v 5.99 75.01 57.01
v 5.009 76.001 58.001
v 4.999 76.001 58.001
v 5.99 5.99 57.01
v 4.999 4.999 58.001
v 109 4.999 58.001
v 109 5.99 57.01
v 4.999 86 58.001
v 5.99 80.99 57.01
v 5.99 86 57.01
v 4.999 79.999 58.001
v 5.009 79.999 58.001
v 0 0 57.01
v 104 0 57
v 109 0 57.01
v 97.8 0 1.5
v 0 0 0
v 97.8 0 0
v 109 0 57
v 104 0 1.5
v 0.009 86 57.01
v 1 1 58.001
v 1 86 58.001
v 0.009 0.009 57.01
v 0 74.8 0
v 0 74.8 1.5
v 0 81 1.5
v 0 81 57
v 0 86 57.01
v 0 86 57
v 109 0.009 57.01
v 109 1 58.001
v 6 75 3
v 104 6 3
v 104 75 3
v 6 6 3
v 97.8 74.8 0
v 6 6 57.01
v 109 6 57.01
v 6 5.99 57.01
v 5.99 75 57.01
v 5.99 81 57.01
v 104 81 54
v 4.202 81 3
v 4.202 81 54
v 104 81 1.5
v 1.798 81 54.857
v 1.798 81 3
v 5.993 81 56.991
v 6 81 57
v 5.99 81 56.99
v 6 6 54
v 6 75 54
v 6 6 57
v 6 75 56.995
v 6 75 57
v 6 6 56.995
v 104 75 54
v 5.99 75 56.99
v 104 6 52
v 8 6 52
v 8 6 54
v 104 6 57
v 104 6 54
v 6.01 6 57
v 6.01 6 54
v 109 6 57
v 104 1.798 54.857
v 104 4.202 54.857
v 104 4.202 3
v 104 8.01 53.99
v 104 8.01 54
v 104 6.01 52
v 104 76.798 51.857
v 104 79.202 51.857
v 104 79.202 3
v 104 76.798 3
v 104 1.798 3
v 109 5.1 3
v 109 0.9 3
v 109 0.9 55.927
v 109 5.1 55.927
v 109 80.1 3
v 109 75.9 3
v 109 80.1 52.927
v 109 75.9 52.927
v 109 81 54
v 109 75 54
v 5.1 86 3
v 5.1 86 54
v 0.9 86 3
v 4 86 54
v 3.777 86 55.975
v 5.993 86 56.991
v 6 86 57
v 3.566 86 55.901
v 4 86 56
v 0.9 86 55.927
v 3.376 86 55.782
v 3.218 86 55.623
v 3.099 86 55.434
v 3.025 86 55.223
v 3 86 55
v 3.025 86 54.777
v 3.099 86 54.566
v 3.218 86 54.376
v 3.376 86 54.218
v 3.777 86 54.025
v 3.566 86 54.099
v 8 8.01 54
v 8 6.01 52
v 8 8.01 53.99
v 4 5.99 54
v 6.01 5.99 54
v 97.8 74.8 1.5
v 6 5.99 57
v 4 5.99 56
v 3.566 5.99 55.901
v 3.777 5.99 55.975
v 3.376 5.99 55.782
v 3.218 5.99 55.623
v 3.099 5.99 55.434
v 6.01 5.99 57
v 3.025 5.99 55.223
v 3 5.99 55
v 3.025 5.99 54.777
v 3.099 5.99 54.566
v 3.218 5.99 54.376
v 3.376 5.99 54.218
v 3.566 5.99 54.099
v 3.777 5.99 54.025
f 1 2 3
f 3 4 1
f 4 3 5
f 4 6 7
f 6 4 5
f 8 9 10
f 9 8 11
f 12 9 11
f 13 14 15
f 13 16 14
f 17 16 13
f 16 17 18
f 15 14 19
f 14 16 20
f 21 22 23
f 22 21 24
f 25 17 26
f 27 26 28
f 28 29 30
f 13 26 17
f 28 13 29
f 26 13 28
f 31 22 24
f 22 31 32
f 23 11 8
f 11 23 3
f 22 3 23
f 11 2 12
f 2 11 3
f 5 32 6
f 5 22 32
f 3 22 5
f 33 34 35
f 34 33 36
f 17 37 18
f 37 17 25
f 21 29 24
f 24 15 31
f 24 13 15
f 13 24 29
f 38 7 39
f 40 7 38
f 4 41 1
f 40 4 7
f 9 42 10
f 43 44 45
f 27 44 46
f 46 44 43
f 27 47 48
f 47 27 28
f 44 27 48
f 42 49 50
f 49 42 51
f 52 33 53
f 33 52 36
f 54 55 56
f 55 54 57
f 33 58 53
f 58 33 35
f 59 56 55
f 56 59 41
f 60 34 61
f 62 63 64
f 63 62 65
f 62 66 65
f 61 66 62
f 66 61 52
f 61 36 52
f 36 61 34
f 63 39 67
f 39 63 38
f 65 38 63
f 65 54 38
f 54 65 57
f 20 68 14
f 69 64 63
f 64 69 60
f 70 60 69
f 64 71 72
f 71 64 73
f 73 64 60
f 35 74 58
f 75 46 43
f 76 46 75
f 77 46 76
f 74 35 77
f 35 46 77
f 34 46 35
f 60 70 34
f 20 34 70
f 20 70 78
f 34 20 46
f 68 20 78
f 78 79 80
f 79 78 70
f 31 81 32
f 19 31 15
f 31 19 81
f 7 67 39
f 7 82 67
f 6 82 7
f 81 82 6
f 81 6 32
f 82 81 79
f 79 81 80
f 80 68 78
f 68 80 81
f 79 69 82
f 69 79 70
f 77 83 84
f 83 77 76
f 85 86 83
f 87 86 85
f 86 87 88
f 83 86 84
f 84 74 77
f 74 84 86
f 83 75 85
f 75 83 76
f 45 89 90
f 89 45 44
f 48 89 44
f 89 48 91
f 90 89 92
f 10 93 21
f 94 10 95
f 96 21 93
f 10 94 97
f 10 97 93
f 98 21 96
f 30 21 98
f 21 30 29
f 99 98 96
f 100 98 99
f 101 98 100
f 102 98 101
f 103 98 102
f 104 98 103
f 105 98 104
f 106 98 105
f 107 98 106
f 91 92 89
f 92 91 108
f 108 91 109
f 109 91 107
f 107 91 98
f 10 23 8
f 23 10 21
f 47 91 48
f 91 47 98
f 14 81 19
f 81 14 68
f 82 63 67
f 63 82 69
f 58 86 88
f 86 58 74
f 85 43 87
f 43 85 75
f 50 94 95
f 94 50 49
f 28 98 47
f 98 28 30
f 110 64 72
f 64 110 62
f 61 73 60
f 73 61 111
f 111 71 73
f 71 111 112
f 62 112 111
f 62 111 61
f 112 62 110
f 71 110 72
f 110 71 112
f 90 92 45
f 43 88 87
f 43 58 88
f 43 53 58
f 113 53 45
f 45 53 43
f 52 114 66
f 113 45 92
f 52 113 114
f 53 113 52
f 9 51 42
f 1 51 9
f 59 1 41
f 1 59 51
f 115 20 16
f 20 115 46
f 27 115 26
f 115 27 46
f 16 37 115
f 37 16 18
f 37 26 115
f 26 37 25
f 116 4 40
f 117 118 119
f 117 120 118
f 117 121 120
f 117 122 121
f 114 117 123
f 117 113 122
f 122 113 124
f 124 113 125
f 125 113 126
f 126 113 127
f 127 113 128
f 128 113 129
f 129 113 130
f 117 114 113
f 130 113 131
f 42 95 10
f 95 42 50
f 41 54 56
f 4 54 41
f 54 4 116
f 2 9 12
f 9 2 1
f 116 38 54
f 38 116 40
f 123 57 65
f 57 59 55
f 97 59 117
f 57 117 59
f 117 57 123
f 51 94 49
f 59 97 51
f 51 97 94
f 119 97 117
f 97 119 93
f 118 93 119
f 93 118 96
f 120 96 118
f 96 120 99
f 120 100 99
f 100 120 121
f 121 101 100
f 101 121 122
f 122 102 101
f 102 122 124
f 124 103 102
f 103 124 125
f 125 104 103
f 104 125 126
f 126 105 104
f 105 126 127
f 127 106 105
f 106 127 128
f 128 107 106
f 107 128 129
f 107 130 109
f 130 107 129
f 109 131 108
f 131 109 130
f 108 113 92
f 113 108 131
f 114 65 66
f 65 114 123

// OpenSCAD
// ============================================================================
// cutlery_box.scad
// Graduated 3-chamber disposable-cutlery box (Option 3) — CUT-FROM-SOLID port
// of build_box.py, for a 120 x 120 x 120 mm printer (AOSEED).
//
// WHY THIS PORT EXISTS (the whole point):
//   The hand-mesh generator (build_box.py) could not keep the 1 mm rim chamfer
//   continuous across the female dovetail joints, because where a slot's flared
//   corner crosses the sloped chamfer it needs a true boolean intersection.
//   OpenSCAD HAS that boolean kernel, so here we do exactly the "cut-from-solid"
//   thing:
//      1. Build the ENTIRE box as ONE solid, WITH the chamfer already on it.
//      2. difference() out vertical dovetail prisms ( /_\ cross-section ),
//         running from just above the base plate up THROUGH the rim, to both
//         (a) form the sliding-dovetail joints, and
//         (b) split the box into 6 bed-sized pieces.
//   Because the cut is a real boolean through the already-chamfered solid, the
//   sloped chamfer<->slot edge is produced for free => the rim chamfer stays
//   CONTINUOUS across every joint, with none of the sliver hacks.
//
// ----------------------------------------------------------------------------
// HOW TO USE
//   In the app:  set `part` below (or use the Customizer dropdown), F5 to
//                preview, F6 to render, then File > Export > STL.
//   One piece (CLI):
//      openscad -o body_knife_A.stl -D 'part="knife_A"' cutlery_box.scad
//   ALL SIX (bash, run from this folder):
//      for p in knife_A knife_B fork_A fork_B spoon_A spoon_B; do \
//        openscad -o "body_$p.stl" -D "part=\"$p\"" cutlery_box.scad ; done
//   PNG preview of one piece:
//      openscad -o knife_B.png --imgsize=1400,1000 --autocenter --viewall \
//        -D 'part="knife_B"' cutlery_box.scad
//
//   Pieces are modelled in ASSEMBLED coordinates (floor-down, z=0 is the bed),
//   so importing all six STLs together shows the assembled box directly; your
//   slicer will auto-drop each one onto the plate for printing.
//
// BED SANITY: every piece is <= 120 mm in X, Y, Z.
//   Z = 58 mm. Widest piece = spoon at 117 mm (Y). A-halves reach 109 mm (X,
//   including the protruding dovetail key). All under 120.
//
// !! I could NOT run OpenSCAD to verify this file (no binary in my sandbox) !!
//   - The rim chamfer is a SMOOTH, true-45 bevel built from hull() frustums of
//     convex rectangles. Works in every OpenSCAD since ~2015 (incl. Homebrew
//     2021.01). No stepped staircase -- and, crucially, it makes box() a clean
//     well-formed solid so the per-part booleans resolve reliably (the old
//     14-slice staircase was fragile and CGAL was dropping the walls of the
//     interior parts, leaving only the key prisms => "floating boxes").
//   - roof() is still available behind USE_ROOF=true for those who have it
//     (2021.01+ snapshots); for THIS rectangular design it is identical, so it
//     is NOT required.
//   - After F6, check the console for "WARNING"/"not a valid 2-manifold".
//     If a tenon ever looks detached, bump EPS to 0.05.
// ============================================================================


/* [Part to render / export] */
part = "knife_A"; // [knife_A, knife_B, fork_A, fork_B, spoon_A, spoon_B, assembly]

/* [Chamfer method] */
// false = smooth hull() frustum bevel (default, any OpenSCAD); true = roof() (2021.01+)
USE_ROOF = false;

/* [Heights (mm)] */
BASE   = 3.0;     // floor / base-plate thickness
COMP_H = 55.0;    // interior wall height above the floor (cutlery stack depth)

/* [Walls (mm)] */
HOST_T   = 6.0;     // thickness of every wall (thick enough to host a dovetail)
HALF_LEN = 104.0;   // printed length of each half (A = near, B = far); <120 incl. key

/* [Chamber bays (mm)] */
N_COL     = 3;       // columns of cutlery per chamber
KNIFE_COL = 23.0;    // -> knife bay 69  (3 x 19 mm knives + play)
FORK_COL  = 33.0;    // -> fork  bay 99  (3 x 29 mm forks  + play)
SPOON_COL = 37.0;    // -> spoon bay 111 (3 x 34 mm spoons + play, trimmed <120)

/* [Dovetail joint (mm)] */
DT_DEPTH = 5.0;   // tail protrusion past the seam (male key depth)
DT_NECK  = 1.2;   // half-width at the seam face (narrow)
DT_FLARE = 2.1;   // half-width at the tip (wide -> locks)
DT_CLR   = 0.4;   // FLANK/seam slide clearance added to the female socket (do not change for fit)
DT_DEPTH_RELIEF = 0.3; // extra depth on the socket BACK only, so the tail tip never bottoms out

/* [Hidden-dovetail top cap / "hat" (mm)] */
// The dovetail otherwise shows its trapezoid outline on the TOP edge of the wall.
// To hide it, the MALE piece extends the wall's full-width top (chamfer included)
// across the key footprint -> a flush, continuous top. The FEMALE piece gets a
// matching top RECESS (cap footprint + CAP_CLR) so the cap drops straight in.
// Result: the top reads as one surface with a single straight seam line at the cap
// tip; the dovetail joinery lives entirely below the cap.
//
// SELF-SUPPORTING UNDERSIDE: the cap reaches the FULL wall width at the chamfer base
// (so the top edge reads as the wall extended, with NO recessed sliver on the outer
// face), and its underside is ONE planar ramp from the chamfer's OUTER CORNER
// (half-width HOST_T/2 at z = BODY_H-CHAMFER) down to the dovetail-neck half-width
// (CAP_FOOT) at CAP_SLANT_DEG from horizontal. No little horizontal step. The ramp
// reaching full width exactly at the chamfer base means "ramp top" == "chamfer base"
// (CAP_H is DERIVED). The FEMALE recess is the same ramp + CAP_CLR play.
// TRADEOFF: because the cap runs all the way to the outer corner, the female wall
// tapers to ~0 at z = BODY_H-CHAMFER -> a thin feather edge at the joint (gradual at
// CAP_SLANT_DEG, hidden inside the joint when assembled). Accepted per design intent.
CAP_SLANT_DEG = 50;     // cap underside ramp angle from horizontal (50 = self-supporting, long flare)
CAP_FOOT = DT_NECK;     // cap-underside half-width where it meets the dovetail neck
CAP_CLR = 0.3;          // slide clearance so the male cap seats into the female top recess

/* [Rim chamfer (mm)] */
CHAMFER = 1.0;    // 45-deg comfort break broken along the top wall edges

/* [Base half-lap / anti-warp (mm)] */
// Neighbouring base plates overlap as a HORIZONTAL half-lap (shiplap) at mid-base
// height, so corners stay coplanar (no lift/protrusion). Horizontal lap faces do
// NOT bind the vertical-drop assembly. Shingle direction: A->B and knife->fork->spoon.
LAP_LEN = 6;        // overlap past the A/B seam and the knife/fork seam
LAP_LEN_FS = 2;     // overlap past the fork/SPOON seam -- SMALLER: spoon is the
                    // tightest piece (117mm of the 120mm bed); a 6mm lap there
                    // would push spoon to 123mm. 2mm keeps spoon at 119mm.
LAP_Z   = BASE/2;   // 1.5 -- horizontal split height of the lap (bottom vs top half)
LAP_CLR = 0.2;      // in-plane clearance so the shelf isn't a press fit

/* [Lid — box features that receive a flat ORDERED clear sheet] */
// The lid itself is NOT printed: it's a flat ~2 mm PETG/Tritan sheet, bullnose-polished
// edges (r=LID_EDGE_R), ordered to size. We only model the box features that receive it.
LID_T            = 2.0;   // ordered sheet thickness
LID_EDGE_R       = 1.0;   // ordered sheet bullnose edge radius (for the sheet order spec)
LID_PLAY         = 0.4;   // total vertical play in the hinge groove (sheet + this)
LID_RECESS       = 2.0;   // lid TOP sits this far BELOW the rim, so the journal pocket is fully
                          // capped (rim caps the bullnose -> retains the lid when raised; tilt-in)
HINGE_AT_MINUS_X = true;  // hinge on the -x (303mm) end wall; clip on +x. (flip = mirror; default delivered)
// perimeter support ledge (lid underside rests on it at z = BODY_H-LID_T)
LEDGE_W          = 2.0;   // ledge inward protrusion (its underside ramps back at 45 deg -> self-supporting)
GROOVE_END_INSET = 0.0;   // groove reaches the corners but RUNS OUT smoothly there (no end-face / no
                          // exposed bore); GROOVE_TAPER sets the run-out length
GROOVE_TAPER     = 4.0;   // y-length over which the eased mouth tapers out at each groove end
// hinge journal (cut into the inner face of the hinge end wall, CONTINUOUS along the long edge)
GROOVE_DEPTH     = 3.0;   // 2mm lead-in slot + 1mm pocket radius -> journal sits 2mm back from the
                          // face so its cap clears the swing relief and RETAINS the lid
GROOVE_POCKET_R  = 1.0;   // journal half-cylinder radius (the bullnose sheet edge rolls in it)
// clip latch (one localized retainer, centered on the clip end wall)
CLIP_W           = 18.0;  // clip width
CLIP_LIP         = 0.4;   // retaining overhang (0.3 light .. 0.6 firm)
CLIP_RAMP_H      = 1.6;   // cam-ramp height above the rim (press-to-close)
// finger scallop (semicircular dish in the rim, centered on & aligned with the clip)
SCALLOP_W        = 16.0;  // scallop width
SCALLOP_DEPTH    = 6.0;   // how far it dishes down from the rim


/* [Hidden] */
EPS      = 0.01;          // tiny overlap so abutting solids fuse cleanly in CGAL
// Upper-chamber pieces (fork, spoon) were cut by a cell plane laid EXACTLY on the
// divider wall's far face (the lower chamber owns that wall). intersection() along a
// plane coincident with an existing box face makes CGAL leave a ZERO-THICKNESS copy
// of the wall face -> edge-manifold + "watertight" but degenerate (OpenSCAD shows it
// as a blue back-face; Tinkercad thickens it into a phantom block). SEAM_EPS nudges
// those cut planes a hair INTO the open bay so they no longer coincide with any box
// face -> no flap. 0.02 mm is physically nothing but is well clear of CGAL's tolerance.
SEAM_EPS = 0.02;
CUT_OVER = 1.0;           // how far dovetail cutters overshoot the rim (clean cut)

BODY_H    = BASE + COMP_H;     // 58  total height
END_WALL  = HOST_T;            // end walls are dovetail hosts too -> equally thick
TOTAL_LEN = 2 * HALF_LEN;      // 208 assembled length (end wall .. end wall)

// hidden-cap ramp geometry (derived).
//   CAP_HW    = cap MAX half-width = HOST_T/2 (the full wall edge) at the chamfer base.
//   CAP_RISE  = vertical height of the self-supporting CAP_SLANT_DEG underside ramp.
//   CAP_ZRAMP = where the cap reaches full width = the chamfer base (BODY_H-CHAMFER), so
//               the ramp runs straight to the chamfer OUTER CORNER (no horizontal step).
//   CAP_ZBOT  = cap bottom = ramp start; CAP_H derived from it (for reference/report).
//   CAP_ZRAMP_R = recess ramp top, shifted down by CAP_CLR so the recess ramp stays
//               parallel to the cap ramp with uniform play.
CAP_HW      = HOST_T/2;   // cap reaches the FULL wall edge at the chamfer base
CAP_RISE    = (CAP_HW - CAP_FOOT) * tan(CAP_SLANT_DEG);
CAP_ZRAMP   = BODY_H - CHAMFER;               // full width exactly at the chamfer base / outer corner
CAP_ZBOT    = CAP_ZRAMP - CAP_RISE;
CAP_H       = BODY_H - CAP_ZBOT;              // derived; reported
CAP_ZRAMP_R = CAP_ZRAMP;   // recess ramp ALSO tops at the chamfer corner (mirror the cap) -> no vertical lip
// sanity checks
assert(CAP_ZBOT > BASE + 1,
       "cap zone dips too low -- raise CAP_SLANT_DEG");
assert(CAP_HW >= DT_FLARE,
       "cap too narrow to cover the dovetail tail");

// NOTE: lid-derived constants are defined BELOW the Y-layout block, because some of
// them (INTERIOR_Y0/Y1, CLIP_CY) depend on OUTER_L / OUTER_R / EXT_W. See "lid derived".

// bay widths
KNIFE_BAY = N_COL * KNIFE_COL; // 69
FORK_BAY  = N_COL * FORK_COL;  // 99
SPOON_BAY = N_COL * SPOON_COL; // 111

// ---- Y layout (width direction): wall | bay | divider | bay | divider | bay | wall
KNIFE_Y0 = 0;
KNIFE_Y1 = HOST_T + KNIFE_BAY + HOST_T;        // 0..81   (outer wall + bay + divider)
FORK_Y0  = KNIFE_Y1;                           // 81
FORK_Y1  = FORK_Y0 + FORK_BAY + HOST_T;        // 81..186 (bay + divider)
SPOON_Y0 = FORK_Y1;                            // 186
SPOON_Y1 = SPOON_Y0 + SPOON_BAY + HOST_T;      // 186..303(bay + outer wall)
EXT_W    = SPOON_Y1;                           // 303 total width

// lengthwise wall Y-bands [y0,y1] (host the A/B dovetails) + their centers
OUTER_L  = [0, HOST_T];                                       // [0,6]    c=3
DIV_KF   = [HOST_T + KNIFE_BAY, HOST_T + KNIFE_BAY + HOST_T]; // [75,81]  c=78
DIV_FS   = [FORK_Y0 + FORK_BAY, FORK_Y0 + FORK_BAY + HOST_T]; // [180,186]c=183
OUTER_R  = [SPOON_Y1 - HOST_T, SPOON_Y1];                     // [297,303]c=300

// ---- lid derived ---- (placed AFTER OUTER_L/OUTER_R/EXT_W so nothing is forward-referenced)
LID_TOP_Z   = BODY_H - LID_RECESS;        // 56  lid TOP (recessed); rim z=58 rises LID_RECESS above it
LID_Z_UNDER = LID_TOP_Z - LID_T;          // 54  lid underside / ledge top / lowered-divider top
POCKET_CZ   = LID_TOP_Z - LID_T/2;        // 55  journal centre (lid mid) -> pocket top = LID_TOP_Z = capped
// hinge end-wall inner face x + inward direction; clip end-wall inner face x + inward dir
HINGE_INX   = HINGE_AT_MINUS_X ? END_WALL : TOTAL_LEN - END_WALL;       // 6  (default)
HINGE_IN    = HINGE_AT_MINUS_X ? 1 : -1;  // interior direction from the hinge wall (+x default)
CLIP_INX    = HINGE_AT_MINUS_X ? TOTAL_LEN - END_WALL : END_WALL;       // 202 (default)
CLIP_IN     = HINGE_AT_MINUS_X ? -1 : 1;  // interior direction from the clip wall (-x default)
POCKET_CX   = HINGE_INX - HINGE_IN*(GROOVE_DEPTH - GROOVE_POCKET_R);    // 5  pocket centre x (INTO the wall)
INTERIOR_Y0 = OUTER_L[1];                 // 6   inner face of the -y short wall
INTERIOR_Y1 = OUTER_R[0];                 // 297 inner face of the +y short wall
CLIP_CY     = EXT_W/2;                     // 151.5 clip/scallop centre (in the fork chamber)
assert(POCKET_CZ - GROOVE_POCKET_R > BASE + 1,
       "journal dips too low -- reduce LID_RECESS or LID_T");
assert(POCKET_CZ + GROOVE_POCKET_R <= LID_TOP_Z + EPS,
       "journal not capped -- lower the lid (raise LID_RECESS) or shrink GROOVE_POCKET_R");
// NOTE: with LID_RECESS the lid underside (and lowered dividers) sit BELOW CAP_ZBOT. That is
// intended: the inner dividers are cut flat below the cap zone (their hidden caps are removed,
// but the lid covers them); the perimeter/end-wall caps are untouched (full-height walls).

// the three OPEN bays are rectangular holes in the wall footprint:
//   footprint = outer rectangle MINUS these bays  (== the 6 walls; verified).
// The smooth chamfer is built from exactly this decomposition.
BAY_X0 = END_WALL;              // 6
BAY_X1 = TOTAL_LEN - END_WALL;  // 202
BAYS = [
    [BAY_X0, BAY_X1, HOST_T,   HOST_T + KNIFE_BAY],   // knife bay [6,202] x [6,75]
    [BAY_X0, BAY_X1, FORK_Y0,  FORK_Y0 + FORK_BAY],   // fork  bay [6,202] x [81,180]
    [BAY_X0, BAY_X1, SPOON_Y0, SPOON_Y0 + SPOON_BAY], // spoon bay [6,202] x [186,297]
];

YC_OUTL  = OUTER_L[0] + HOST_T/2;   // 3   outer-left wall center
YC_DIVKF = DIV_KF[0]  + HOST_T/2;   // 78  knife/fork divider center
YC_DIVFS = DIV_FS[0]  + HOST_T/2;   // 183 fork/spoon divider center
YC_OUTR  = OUTER_R[0] + HOST_T/2;   // 300 outer-right wall center

// seams
AB_SEAM = HALF_LEN;               // 104  A/B length seam (x)
SEAM_KF = FORK_Y0;                // 81   knife/fork width seam (y)
SEAM_FS = SPOON_Y0;              // 186  fork/spoon width seam (y)
ENDC_A  = END_WALL/2;             // 3    A end-wall center (x) -> chamber dovetails
ENDC_B  = TOTAL_LEN - END_WALL/2; // 205  B end-wall center (x)


// ============================================================================
// 2D wall footprint (cross-section of all walls, constant in z for the straight
// part). Union of: 2 full-width end walls + 4 lengthwise walls between them.
// ============================================================================
module wall_footprint_2d() {
    // footprint = outer rectangle minus the 3 open bays  (== the 6 walls)
    difference() {
        square([TOTAL_LEN, EXT_W]);
        for (b = BAYS) translate([b[0], b[2]]) square([b[1] - b[0], b[3] - b[2]]);
    }
}

// ============================================================================
// The full chamfered box solid = base plate + walls with a continuous 1 mm
// top-rim chamfer. Built ONCE; every piece is carved out of this.
// ============================================================================
module chamfer_cap() {
    // SMOOTH 45 rim chamfer over z[BODY_H-CHAMFER, BODY_H], in absolute coords.
    zm = BODY_H - CHAMFER;
    if (USE_ROOF) {
        // exact straight-skeleton roof, capped at CHAMFER height (needs roof()).
        intersection() {
            translate([0,0,zm]) roof() wall_footprint_2d();
            translate([0,0,zm]) linear_extrude(CHAMFER + EPS) wall_footprint_2d();
        }
    } else {
        // DEFAULT: true 45 bevel as hull() frustums of CONVEX rectangles -> smooth
        // AND a clean manifold.  Since footprint = outer - bays, the chamfer of the
        // footprint = (outer rectangle beveled inward) MINUS (each bay beveled so it
        // grows toward the top, which bevels every bay-facing rim).  All hull()s are
        // on convex rectangles, so nothing gets convex-filled.
        difference() {
            // outer perimeter frustum: full outer rect at zm -> inset by CHAMFER at top
            hull() {
                translate([0,0,zm])     linear_extrude(0.001) square([TOTAL_LEN, EXT_W]);
                translate([0,0,BODY_H]) linear_extrude(0.001) offset(delta=-CHAMFER) square([TOTAL_LEN, EXT_W]);
            }
            // each bay grows by CHAMFER toward the top -> bevels its surrounding rim.
            // (overshoots z a hair past both ends so the cut is clean.)
            for (b = BAYS)
                hull() {
                    translate([0,0,zm-EPS])     linear_extrude(0.001)
                        translate([b[0],b[2]]) offset(delta=-EPS)        square([b[1]-b[0], b[3]-b[2]]);
                    translate([0,0,BODY_H+EPS]) linear_extrude(0.001)
                        translate([b[0],b[2]]) offset(delta=CHAMFER+EPS) square([b[1]-b[0], b[3]-b[2]]);
                }
        }
    }
}

module box() {
    zm = BODY_H - CHAMFER;
    union() {
        cube([TOTAL_LEN, EXT_W, BASE]);                                        // base plate z[0,3]
        translate([0,0,BASE]) linear_extrude(zm - BASE + EPS) wall_footprint_2d(); // straight walls z[3,57]
        chamfer_cap();                                                         // smooth chamfer z[57,58]
    }
}

// ============================================================================
// Dovetail prisms ( /_\ ). Vertical, z[BASE, BODY_H+CUT_OVER] so they cut
// through the rim but leave the base plate continuous. The near face is pushed
// back EPS so a male key always fuses to its wall.
//   male key   : half_n=DT_NECK,         half_f=DT_FLARE
//   female slot: half_n=DT_NECK+DT_CLR,  half_f=DT_FLARE+DT_CLR
// ============================================================================
module dt_prism_X(seam_x, yc, half_n, half_f) {   // perpendicular to X, grows +X
    translate([0,0,BASE]) linear_extrude(BODY_H - BASE + CUT_OVER)
        polygon([[seam_x - EPS,        yc - half_n],
                 [seam_x + DT_DEPTH,   yc - half_f],
                 [seam_x + DT_DEPTH,   yc + half_f],
                 [seam_x - EPS,        yc + half_n]]);
}
module dt_prism_Y(seam_y, xc, half_n, half_f) {   // perpendicular to Y, grows +Y
    translate([0,0,BASE]) linear_extrude(BODY_H - BASE + CUT_OVER)
        polygon([[xc - half_n, seam_y - EPS],
                 [xc - half_f, seam_y + DT_DEPTH],
                 [xc + half_f, seam_y + DT_DEPTH],
                 [xc + half_n, seam_y - EPS]]);
}
module ab_key   (yc)        { dt_prism_X(AB_SEAM, yc, DT_NECK, DT_FLARE); }
module ch_key   (seam_y, xc){ dt_prism_Y(seam_y, xc, DT_NECK, DT_FLARE); }

// Female sockets = male + DT_CLR on the flanks/seam (unchanged), PLUS a straight
// back-face relief of DT_DEPTH_RELIEF so the tail tip never bottoms out. The
// relief is a rectangle tacked onto the trapezoid's tip at the SAME flare width,
// so the angled flank faces (and their 0.4 mm slide clearance) are untouched.
module ab_socket(yc) {
    dt_prism_X(AB_SEAM, yc, DT_NECK + DT_CLR, DT_FLARE + DT_CLR);
    translate([0,0,BASE]) linear_extrude(BODY_H - BASE + CUT_OVER)
        translate([AB_SEAM + DT_DEPTH, yc - (DT_FLARE + DT_CLR)])
            square([DT_DEPTH_RELIEF, 2*(DT_FLARE + DT_CLR)]);          // back relief, +X
}
module ch_socket(seam_y, xc) {
    dt_prism_Y(seam_y, xc, DT_NECK + DT_CLR, DT_FLARE + DT_CLR);
    translate([0,0,BASE]) linear_extrude(BODY_H - BASE + CUT_OVER)
        translate([xc - (DT_FLARE + DT_CLR), seam_y + DT_DEPTH])
            square([2*(DT_FLARE + DT_CLR), DT_DEPTH_RELIEF]);          // back relief, +Y
}

// ===== hidden-dovetail top cap ("hat"), SELF-SUPPORTING underside ===============
// MALE cap: a FULL-wall-width hat whose underside is ONE planar ramp from the chamfer's
// OUTER CORNER (half-width CAP_HW = HOST_T/2 at CAP_ZRAMP = BODY_H-CHAMFER) down to the
// dovetail-neck half-width (CAP_FOOT) at CAP_SLANT_DEG from horizontal -> the self-
// supporting shoulder, running straight to the corner (no horizontal step). Built as
// hull(narrow bottom slab buried in the tail neck, full-width top slab through the rim);
// box() trims it to the wall and adds the continuous rim chamfer for free, so the outer
// top edge reads as the wall extended (no recessed sliver). The protruding NOSE is left
// SQUARE (vertical) -- hidden in the female socket when assembled.
// TRADEOFF: the female wall tapers to ~0 at z=BODY_H-CHAMFER (a thin feather edge at the
// joint, gradual at CAP_SLANT_DEG) -- accepted per design intent.
module ab_cap(yc) {   // A/B seam, grows +X past the seam (length direction)
    hull() {
        translate([AB_SEAM - EPS, yc - CAP_FOOT, CAP_ZBOT])
            cube([DT_DEPTH + EPS, 2*CAP_FOOT, EPS]);
        translate([AB_SEAM - EPS, yc - CAP_HW,   CAP_ZRAMP])
            cube([DT_DEPTH + EPS, 2*CAP_HW, (BODY_H + CUT_OVER) - CAP_ZRAMP]);
    }
}
module ch_cap(seam_y, xc) {   // chamber seam, grows +Y past the seam (in the end wall)
    hull() {
        translate([xc - CAP_FOOT, seam_y - EPS, CAP_ZBOT])
            cube([2*CAP_FOOT, DT_DEPTH + EPS, EPS]);
        translate([xc - CAP_HW,   seam_y - EPS, CAP_ZRAMP])
            cube([2*CAP_HW, DT_DEPTH + EPS, (BODY_H + CUT_OVER) - CAP_ZRAMP]);
    }
}
// FEMALE recess: the SAME ramp grown by CAP_CLR (flanks, tip, floor, and ramp shifted down
// by CAP_CLR so it stays parallel) -> the cap seats with uniform slide clearance. It opens
// to the wall edge (and a hair past, into air) so the cap's full-width corner drops in;
// this is what leaves the thin female feather at the top (accepted). Open upward + toward seam.
module ab_cap_neg(yc) {
    hull() {
        translate([AB_SEAM - EPS, yc - (CAP_FOOT + CAP_CLR), CAP_ZBOT - CAP_CLR])
            cube([DT_DEPTH + CAP_CLR + EPS, 2*(CAP_FOOT + CAP_CLR), EPS]);
        translate([AB_SEAM - EPS, yc - (CAP_HW + EPS), CAP_ZRAMP_R])
            cube([DT_DEPTH + CAP_CLR + EPS, 2*(CAP_HW + EPS), (BODY_H + CUT_OVER + 1) - CAP_ZRAMP_R]);
    }
}
module ch_cap_neg(seam_y, xc) {
    hull() {
        translate([xc - (CAP_FOOT + CAP_CLR), seam_y - EPS, CAP_ZBOT - CAP_CLR])
            cube([2*(CAP_FOOT + CAP_CLR), DT_DEPTH + CAP_CLR + EPS, EPS]);
        translate([xc - (CAP_HW + EPS), seam_y - EPS, CAP_ZRAMP_R])
            cube([2*(CAP_HW + EPS), DT_DEPTH + CAP_CLR + EPS, (BODY_H + CUT_OVER + 1) - CAP_ZRAMP_R]);
    }
}
// LOWERED-DIVIDER hat: same 50-deg self-supporting cap as ab_cap, but reaching FULL width at the
// LOWERED divider top (LID_Z_UNDER) instead of the rim -- because the inner dividers are lowered
// for the lid, which strips their normal cap. It extends above the top and is trimmed flush to
// LID_Z_UNDER by divider_lower(), so the divider top reads as one surface (dovetail hidden below).
DCAP_ZRAMP = LID_Z_UNDER;            // full width at the lowered divider top (54)
DCAP_ZBOT  = DCAP_ZRAMP - CAP_RISE;  // ramp start (neck), 50 deg below
module div_cap(yc) {        // male hat on the lowered divider (A/B seam)
    hull() {
        translate([AB_SEAM - EPS, yc - CAP_FOOT, DCAP_ZBOT])
            cube([DT_DEPTH + EPS, 2*CAP_FOOT, EPS]);
        translate([AB_SEAM - EPS, yc - CAP_HW,   DCAP_ZRAMP])
            cube([DT_DEPTH + EPS, 2*CAP_HW, (BODY_H + CUT_OVER) - DCAP_ZRAMP]);
    }
}
module div_cap_neg(yc) {    // female recess to receive div_cap (with CAP_CLR slide play)
    hull() {
        translate([AB_SEAM - EPS, yc - (CAP_FOOT + CAP_CLR), DCAP_ZBOT - CAP_CLR])
            cube([DT_DEPTH + CAP_CLR + EPS, 2*(CAP_FOOT + CAP_CLR), EPS]);
        translate([AB_SEAM - EPS, yc - (CAP_HW + EPS), DCAP_ZRAMP])
            cube([DT_DEPTH + CAP_CLR + EPS, 2*(CAP_HW + EPS), (BODY_H + CUT_OVER + 1) - DCAP_ZRAMP]);
    }
}

// rectangular cell (x[xa,xb], y[ya,yb], full height + margin) used to split pieces
module cell(xa, xb, ya, yb) {
    translate([xa, ya, -1]) cube([xb - xa, yb - ya, BODY_H + 11]);
}

// ===== base half-lap (shiplap) =================================================
// HORIZONTAL lap at mid-base height: the shelf-owner keeps its BOTTOM half
// (z 0..LAP_Z) extending LAP_LEN past the seam; the neighbour has its bottom half
// REMOVED there (keeps only the top half) and lands flat on the shelf. Horizontal
// faces => no binding during the vertical drop. Shelves live entirely in the base
// (z < BASE), well clear of the wall dovetails (z >= BASE).
// Shingle = FEMALE-first (matches the no-notch dovetail assembly order, which
// lowers the male piece onto the female): the B half owns the A/B shelf (grows
// -X into A) and the UPPER chamber (fork, spoon) owns the chamber shelf (grows
// -Y into the lower chamber).  Order: spoon, fork, knife; B before A.
module lap_shelf_X(y0, y1) {                 // B-side shelf, grows -X into A past AB_SEAM
    // +EPS past AB_SEAM so the shelf interpenetrates (not just abuts) its own B body -> fuses cleanly.
    translate([AB_SEAM - LAP_LEN, y0, 0]) cube([LAP_LEN + EPS, y1 - y0, LAP_Z]);
}
module lap_neg_X(y0, y1) {                   // A-side: remove bottom half to receive it
    translate([AB_SEAM - LAP_LEN - LAP_CLR, y0 - EPS, -EPS])
        cube([LAP_LEN + LAP_CLR + EPS, (y1 - y0) + 2*EPS, LAP_Z + EPS]);
}
module lap_shelf_Y(seam_y, x0, x1, ln=LAP_LEN) {   // upper-chamber shelf, grows -Y into lower
    // grows -Y by `ln` into the lower chamber AND +Y by 2*SEAM_EPS past the seam so it
    // always overlaps the (SEAM_EPS-nudged) body floor and stays fused -> no floating shelf.
    translate([x0, seam_y - ln, 0]) cube([x1 - x0, ln + 2*SEAM_EPS, LAP_Z]);
}
module lap_neg_Y(seam_y, x0, x1, ln=LAP_LEN) {     // lower-chamber: remove bottom half
    translate([x0 - EPS, seam_y - ln - LAP_CLR, -EPS])
        cube([(x1 - x0) + 2*EPS, ln + LAP_CLR + EPS, LAP_Z + EPS]);
}

// ============================================================================
// LID FEATURES (receive a flat ORDERED clear sheet; the sheet is not printed).
// All features live at the TOP (z >= ~52), ABOVE the dovetail engagement, the half-lap
// (z<1.5) and most of the hat, so the vertical-drop assembly and joints are untouched.
// EPS overlaps throughout; no coincident coplanar faces with the existing walls.
// Default orientation: HINGE on the -x end wall (A pieces), CLIP on the +x end wall
// (B pieces), clip+scallop centred on the fork (middle) chamber.
// ============================================================================

// --- perimeter support ledge: 45-deg self-supporting brackets; rest face at LID_Z_UNDER.
//     Runs along the CLIP end wall + the two short outer walls. (Hinge wall uses the groove.)
//     Built as hull(thin top edge, wall column) -> a triangular bracket whose underside is
//     a 45-deg ramp (prints floor-down with no support). ADDED to each piece (clipped by cell).
//     Each run is INSET by LEDGE_W from the perpendicular walls so the three brackets never
//     overlap at a corner and the wall's normal chamfer wraps every corner uninterrupted.
module lid_ledge() {
    cy0 = INTERIOR_Y0 + LEDGE_W;  cy1 = INTERIOR_Y1 - LEDGE_W;  cyl = cy1 - cy0;   // clip-run y span (inset)
    sx0 = END_WALL    + LEDGE_W;  sxl = (TOTAL_LEN - 2*END_WALL) - 2*LEDGE_W;       // short-run x span (inset)
    // clip end wall (x = CLIP_INX), bracket protrudes toward interior (CLIP_IN)
    hull() {
        translate([CLIP_INX + CLIP_IN*LEDGE_W, cy0, LID_Z_UNDER - EPS]) cube([EPS, cyl, EPS]);
        translate([CLIP_INX - EPS,             cy0, LID_Z_UNDER - LEDGE_W]) cube([2*EPS, cyl, LEDGE_W]);
    }
    // OUTER_L short wall (y = INTERIOR_Y0), bracket protrudes +y
    hull() {
        translate([sx0, INTERIOR_Y0 + LEDGE_W, LID_Z_UNDER - EPS]) cube([sxl, EPS, EPS]);
        translate([sx0, INTERIOR_Y0 - EPS,     LID_Z_UNDER - LEDGE_W]) cube([sxl, 2*EPS, LEDGE_W]);
    }
    // OUTER_R short wall (y = INTERIOR_Y1), bracket protrudes -y
    hull() {
        translate([sx0, INTERIOR_Y1 - LEDGE_W, LID_Z_UNDER - EPS]) cube([sxl, EPS, EPS]);
        translate([sx0, INTERIOR_Y1 - EPS,     LID_Z_UNDER - LEDGE_W]) cube([sxl, 2*EPS, LEDGE_W]);
    }
}

// --- hinge groove: ONE 2D cross-section (journal bore + lead-in slot + 45-deg swing ramp),
//     CAPPED at the recessed lid top (LID_TOP_Z), swept along the wall. At BOTH ends the whole
//     profile RUNS OUT smoothly -- it tapers to the inner-top rim corner (HINGE_INX, BODY_H) --
//     so there is NO end-face and NO exposed bore at the corners; the groove just fades into the
//     wall. The rim caps the bullnose (retains the lid, tilt-in); the 45-deg ramp is self-
//     supporting and gives the swing clearance; the cap stays full over the bullnose => retains.
module groove_profile() {                            // 2D cross-section in (x, z)
    union() {
        translate([POCKET_CX, POCKET_CZ]) circle(r = GROOVE_POCKET_R, $fn = 28);              // journal bore
        translate([POCKET_CX, LID_Z_UNDER]) square([HINGE_INX - POCKET_CX + EPS, LID_T]);     // lead-in slot
        polygon([[POCKET_CX, LID_TOP_Z], [HINGE_INX + EPS, LID_TOP_Z], [HINGE_INX + EPS, BODY_H - CHAMFER]]); // swing relief (below the rim chamfer)
        polygon([[HINGE_INX, BODY_H - CHAMFER], [HINGE_INX + EPS, BODY_H + EPS], [HINGE_INX - CHAMFER, BODY_H + EPS]]); // rim chamfer cut, CONTINUOUS through the divider junctions (no bulge)
    }
}
module groove_extrude(y0, y1) {                      // sweep the profile along the wall, y0..y1
    translate([0, y0, 0]) rotate([90,0,0]) translate([0,0,-(y1 - y0)]) linear_extrude(y1 - y0) groove_profile();
}
module hinge_groove() {
    // journal runs STRAIGHT to the end of the wall at each side; the perpendicular short wall
    // caps the bore there (no run-out). The EPS overlap tucks the bore end into the short wall.
    groove_extrude(INTERIOR_Y0 - EPS, INTERIOR_Y1 + EPS);
}

// --- lower the inner chamber dividers to the lid underside (mid-support, no sag).
//     Removes the divider top over the full length; outer walls keep full height.
module divider_lower() {
    // x-span is the CHAMBER BAY only [BAY_X0, BAY_X1] (+EPS overlap into the end walls so the
    // cut is manifold). The end/outer walls keep their full BODY_H tops; only the two INNER
    // dividers (DIV_KF, DIV_FS) are lowered.
    translate([BAY_X0 - EPS, DIV_KF[0], LID_Z_UNDER]) cube([BAY_X1 - BAY_X0 + 2*EPS, HOST_T, BODY_H - LID_Z_UNDER + CUT_OVER]);
    translate([BAY_X0 - EPS, DIV_FS[0], LID_Z_UNDER]) cube([BAY_X1 - BAY_X0 + 2*EPS, HOST_T, BODY_H - LID_Z_UNDER + CUT_OVER]);
}

// --- retaining clip (ADDED): a lip on the clip end wall, centred on CLIP_CY, that overhangs
//     the RECESSED lid top (LID_TOP_Z) by CLIP_LIP and holds it down. A lead-in ramp above the
//     lip (up to LID_TOP_Z+CLIP_RAMP_H, still below the rim) cams the lid under as it swings
//     closed. Anchored into the wall (x = CLIP_INX-CLIP_IN*HOST_T/2). Added AFTER the scallop
//     cut so the scallop never undercuts it. No longer protrudes above the rim.
module lid_clip() {
    translate([0, CLIP_CY - CLIP_W/2, 0]) rotate([90,0,0]) translate([0,0,-CLIP_W]) linear_extrude(CLIP_W)
        polygon([[CLIP_INX - CLIP_IN*HOST_T/2, LID_TOP_Z - 0.8],         // anchor low, into the wall (fuse)
                 [CLIP_INX + CLIP_IN*CLIP_LIP, LID_TOP_Z],               // lip tip: overhang over the lid top
                 [CLIP_INX + CLIP_IN*CLIP_LIP, LID_TOP_Z + 0.4],         // lip front
                 [CLIP_INX - CLIP_IN*HOST_T/2, LID_TOP_Z + CLIP_RAMP_H]]);// lead-in ramp up into the wall
}

// --- finger scallop (CUT): a semicircular dish in the rim's INNER edge at the clip, so a
//     fingertip reaches under the lid edge to release it. Interior half only (does not
//     touch the wall body or the clip's anchor).
module lid_scallop() {
    intersection() {
        translate([CLIP_INX, CLIP_CY, BODY_H - SCALLOP_DEPTH]) cylinder(h = SCALLOP_DEPTH + EPS, r = SCALLOP_W/2, $fn = 40);
        translate([CLIP_INX + (CLIP_IN<0 ? -SCALLOP_W : 0), CLIP_CY - SCALLOP_W, BODY_H - SCALLOP_DEPTH - EPS])
            cube([SCALLOP_W, 2*SCALLOP_W, SCALLOP_DEPTH + 2*EPS]);
    }
}

// ============================================================================
// The six pieces.  piece = intersection(box, cell + own male keys) - own sockets
//   A halves are MALE on the A/B seam (keep the key); B halves are FEMALE (slot).
//   On a chamber seam the LEFT chamber is male (+Y), the right chamber is female.
// ============================================================================
// Base half-lap shingling (FEMALE-first, Option 1):
//   A/B seam  -> the B half owns the bottom shelf (grows -X), A has the negative.
//   chamber   -> the UPPER chamber (fork, spoon) owns the shelf (grows -Y); the
//                lower chamber (knife, fork) has the negative.
//   Assembly order: spoon, fork, knife; B before A (male lowered onto female).
// Center crossings (104,81)&(104,186): the CHAMBER shelf (fork_A / spoon_A) owns the
//   crossing square; the B-half A/B shelf (knife_B / fork_B) is CLIPPED short of the
//   chamber seam by LAP_LEN so two shelves never collide.
module knife_A() {                                       // placed LAST; receives everything
    difference() {
        union() {
            intersection() {
                box();
                union() {
                    cell(-1, AB_SEAM, KNIFE_Y0 - 1, KNIFE_Y1);
                    ab_key(YC_OUTL); ab_key(YC_DIVKF); ch_key(SEAM_KF, ENDC_A);
                    ab_cap(YC_OUTL); div_cap(YC_DIVKF); ch_cap(SEAM_KF, ENDC_A);  // hide tops (divider uses LOWERED hat)
                }
            }
            intersection() { lid_ledge(); cell(-1, AB_SEAM, KNIFE_Y0 - 1, KNIFE_Y1); }  // lid support ledge
        }
        lap_neg_X(KNIFE_Y0, KNIFE_Y1);            // receive knife_B's A/B shelf
        lap_neg_Y(SEAM_KF, 0, AB_SEAM);           // receive fork_A's chamber shelf
        hinge_groove(); divider_lower(); lid_scallop();   // lid cuts (groove hits A pieces; divider/scallop where present)
    }
}

module knife_B() {
    difference() {
        union() {
            intersection() {
                box();
                union() {
                    cell(AB_SEAM, TOTAL_LEN + 1, KNIFE_Y0 - 1, KNIFE_Y1);
                    ch_key(SEAM_KF, ENDC_B);
                    ch_cap(SEAM_KF, ENDC_B);                // hide top (male, chamber)
                }
            }
            lap_shelf_X(KNIFE_Y0, KNIFE_Y1 - LAP_LEN);  // A/B shelf -> knife_A (CLIPPED at y=81 crossing)
            intersection() { lid_ledge(); cell(AB_SEAM, TOTAL_LEN + 1, KNIFE_Y0 - 1, KNIFE_Y1); }  // lid support ledge
        }
        ab_socket(YC_OUTL); ab_socket(YC_DIVKF);
        ab_cap_neg(YC_OUTL); div_cap_neg(YC_DIVKF);      // top recesses to receive knife_A's caps (divider = LOWERED hat)
        lap_neg_Y(SEAM_KF, AB_SEAM, TOTAL_LEN);         // receive fork_B's chamber shelf
        hinge_groove(); divider_lower(); lid_scallop();   // lid cuts
    }
}

module fork_A() {
    difference() {
        union() {
            intersection() {
                box();
                union() {
                    cell(-1, AB_SEAM, FORK_Y0 + SEAM_EPS, FORK_Y1);  // -Y cut nudged off the divider face
                    ab_key(YC_DIVFS); ch_key(SEAM_FS, ENDC_A);
                    div_cap(YC_DIVFS); ch_cap(SEAM_FS, ENDC_A);       // hide tops (divider uses LOWERED hat)
                }
            }
            lap_shelf_Y(SEAM_KF, 0, AB_SEAM);           // chamber shelf -> knife_A (owns crossing)
            intersection() { lid_ledge(); cell(-1, AB_SEAM, FORK_Y0 + SEAM_EPS, FORK_Y1); }  // lid support ledge (none in fork-A)
        }
        lap_neg_X(FORK_Y0, FORK_Y1);                    // receive fork_B's A/B shelf
        ch_socket(SEAM_KF, ENDC_A);
        ch_cap_neg(SEAM_KF, ENDC_A);                    // top recess to receive knife_A's chamber cap (female)
        lap_neg_Y(SEAM_FS, 0, AB_SEAM, LAP_LEN_FS);     // receive spoon_A's (small) chamber shelf
        hinge_groove(); divider_lower(); lid_scallop();   // lid cuts (groove = fork-A hinge segment; divider = DIV_FS)
    }
}

module fork_B() {
    union() {
        difference() {
            union() {
                intersection() {
                    box();
                    union() {
                        cell(AB_SEAM, TOTAL_LEN + 1, FORK_Y0 + SEAM_EPS, FORK_Y1);  // -Y cut nudged off the divider face
                        ch_key(SEAM_FS, ENDC_B);
                        ch_cap(SEAM_FS, ENDC_B);                // hide top (male, chamber)
                    }
                }
                lap_shelf_X(FORK_Y0, FORK_Y1 - LAP_LEN_FS); // A/B shelf -> fork_A (CLIPPED at y=186 crossing)
                lap_shelf_Y(SEAM_KF, AB_SEAM, TOTAL_LEN);   // chamber shelf -> knife_B
                intersection() { lid_ledge(); cell(AB_SEAM, TOTAL_LEN + 1, FORK_Y0 + SEAM_EPS, FORK_Y1); }  // lid ledge (clip-end run)
            }
            ab_socket(YC_DIVFS);
            div_cap_neg(YC_DIVFS);                           // top recess to receive fork_A's A/B cap (divider = LOWERED hat)
            ch_socket(SEAM_KF, ENDC_B);
            ch_cap_neg(SEAM_KF, ENDC_B);                    // top recess to receive knife_B's chamber cap (female)
            lap_neg_Y(SEAM_FS, AB_SEAM, TOTAL_LEN, LAP_LEN_FS); // receive spoon_B's (small) chamber shelf
            hinge_groove(); divider_lower(); lid_scallop();     // lid cuts (scallop lands here)
        }
        intersection() { lid_clip(); cell(AB_SEAM, TOTAL_LEN + 1, FORK_Y0 + SEAM_EPS, FORK_Y1); }  // retaining clip, added AFTER the scallop cut
    }
}

module spoon_A() {
    difference() {
        union() {
            intersection() {
                box();
                union() {
                    cell(-1, AB_SEAM, SPOON_Y0 + SEAM_EPS, SPOON_Y1 + 1);  // -Y cut nudged off the divider face
                    ab_key(YC_OUTR);
                    ab_cap(YC_OUTR);                        // hide top (male)
                }
            }
            lap_shelf_Y(SEAM_FS, 0, AB_SEAM, LAP_LEN_FS); // chamber shelf -> fork_A (small; owns crossing)
            intersection() { lid_ledge(); cell(-1, AB_SEAM, SPOON_Y0 + SEAM_EPS, SPOON_Y1 + 1); }  // lid support ledge (OUTER_R run)
        }
        lap_neg_X(SPOON_Y0, SPOON_Y1);                  // receive spoon_B's A/B shelf
        ch_socket(SEAM_FS, ENDC_A);
        ch_cap_neg(SEAM_FS, ENDC_A);                    // top recess to receive fork_A's chamber cap (female)
        hinge_groove(); divider_lower(); lid_scallop();   // lid cuts (groove = spoon-A hinge segment)
    }
}

module spoon_B() {                                      // placed FIRST; owns shelves
    difference() {
        union() {
            intersection() {
                box();
                union() {
                    cell(AB_SEAM, TOTAL_LEN + 1, SPOON_Y0 + SEAM_EPS, SPOON_Y1 + 1);  // -Y cut nudged off the divider face
                }
            }
            lap_shelf_X(SPOON_Y0, SPOON_Y1);            // A/B shelf -> spoon_A
            lap_shelf_Y(SEAM_FS, AB_SEAM, TOTAL_LEN, LAP_LEN_FS); // chamber shelf -> fork_B (small)
            intersection() { lid_ledge(); cell(AB_SEAM, TOTAL_LEN + 1, SPOON_Y0 + SEAM_EPS, SPOON_Y1 + 1); }  // lid ledge (OUTER_R + clip-end runs)
        }
        ab_socket(YC_OUTR);
        ab_cap_neg(YC_OUTR);                            // top recess to receive spoon_A's A/B cap (female)
        ch_socket(SEAM_FS, ENDC_B);
        ch_cap_neg(SEAM_FS, ENDC_B);                    // top recess to receive fork_B's chamber cap (female)
        hinge_groove(); divider_lower(); lid_scallop();   // lid cuts
    }
}

// Fast preview: the full continuous-chamfer box (no cuts). The six part modules
// above are the real, separable pieces. To instead see the TRUE assembled
// pieces with their joints (slower — 6 booleans), replace box(); below with:
//   knife_A(); knife_B(); fork_A(); fork_B(); spoon_A(); spoon_B();
module assembly() {
    box();
}

// ============================================================================
// Render dispatch
// ============================================================================
if      (part == "knife_A")  knife_A();
else if (part == "knife_B")  knife_B();
else if (part == "fork_A")   fork_A();
else if (part == "fork_B")   fork_B();
else if (part == "spoon_A")  spoon_A();
else if (part == "spoon_B")  spoon_B();
else if (part == "assembly") assembly();
else echo(str("Unknown part: ", part));
